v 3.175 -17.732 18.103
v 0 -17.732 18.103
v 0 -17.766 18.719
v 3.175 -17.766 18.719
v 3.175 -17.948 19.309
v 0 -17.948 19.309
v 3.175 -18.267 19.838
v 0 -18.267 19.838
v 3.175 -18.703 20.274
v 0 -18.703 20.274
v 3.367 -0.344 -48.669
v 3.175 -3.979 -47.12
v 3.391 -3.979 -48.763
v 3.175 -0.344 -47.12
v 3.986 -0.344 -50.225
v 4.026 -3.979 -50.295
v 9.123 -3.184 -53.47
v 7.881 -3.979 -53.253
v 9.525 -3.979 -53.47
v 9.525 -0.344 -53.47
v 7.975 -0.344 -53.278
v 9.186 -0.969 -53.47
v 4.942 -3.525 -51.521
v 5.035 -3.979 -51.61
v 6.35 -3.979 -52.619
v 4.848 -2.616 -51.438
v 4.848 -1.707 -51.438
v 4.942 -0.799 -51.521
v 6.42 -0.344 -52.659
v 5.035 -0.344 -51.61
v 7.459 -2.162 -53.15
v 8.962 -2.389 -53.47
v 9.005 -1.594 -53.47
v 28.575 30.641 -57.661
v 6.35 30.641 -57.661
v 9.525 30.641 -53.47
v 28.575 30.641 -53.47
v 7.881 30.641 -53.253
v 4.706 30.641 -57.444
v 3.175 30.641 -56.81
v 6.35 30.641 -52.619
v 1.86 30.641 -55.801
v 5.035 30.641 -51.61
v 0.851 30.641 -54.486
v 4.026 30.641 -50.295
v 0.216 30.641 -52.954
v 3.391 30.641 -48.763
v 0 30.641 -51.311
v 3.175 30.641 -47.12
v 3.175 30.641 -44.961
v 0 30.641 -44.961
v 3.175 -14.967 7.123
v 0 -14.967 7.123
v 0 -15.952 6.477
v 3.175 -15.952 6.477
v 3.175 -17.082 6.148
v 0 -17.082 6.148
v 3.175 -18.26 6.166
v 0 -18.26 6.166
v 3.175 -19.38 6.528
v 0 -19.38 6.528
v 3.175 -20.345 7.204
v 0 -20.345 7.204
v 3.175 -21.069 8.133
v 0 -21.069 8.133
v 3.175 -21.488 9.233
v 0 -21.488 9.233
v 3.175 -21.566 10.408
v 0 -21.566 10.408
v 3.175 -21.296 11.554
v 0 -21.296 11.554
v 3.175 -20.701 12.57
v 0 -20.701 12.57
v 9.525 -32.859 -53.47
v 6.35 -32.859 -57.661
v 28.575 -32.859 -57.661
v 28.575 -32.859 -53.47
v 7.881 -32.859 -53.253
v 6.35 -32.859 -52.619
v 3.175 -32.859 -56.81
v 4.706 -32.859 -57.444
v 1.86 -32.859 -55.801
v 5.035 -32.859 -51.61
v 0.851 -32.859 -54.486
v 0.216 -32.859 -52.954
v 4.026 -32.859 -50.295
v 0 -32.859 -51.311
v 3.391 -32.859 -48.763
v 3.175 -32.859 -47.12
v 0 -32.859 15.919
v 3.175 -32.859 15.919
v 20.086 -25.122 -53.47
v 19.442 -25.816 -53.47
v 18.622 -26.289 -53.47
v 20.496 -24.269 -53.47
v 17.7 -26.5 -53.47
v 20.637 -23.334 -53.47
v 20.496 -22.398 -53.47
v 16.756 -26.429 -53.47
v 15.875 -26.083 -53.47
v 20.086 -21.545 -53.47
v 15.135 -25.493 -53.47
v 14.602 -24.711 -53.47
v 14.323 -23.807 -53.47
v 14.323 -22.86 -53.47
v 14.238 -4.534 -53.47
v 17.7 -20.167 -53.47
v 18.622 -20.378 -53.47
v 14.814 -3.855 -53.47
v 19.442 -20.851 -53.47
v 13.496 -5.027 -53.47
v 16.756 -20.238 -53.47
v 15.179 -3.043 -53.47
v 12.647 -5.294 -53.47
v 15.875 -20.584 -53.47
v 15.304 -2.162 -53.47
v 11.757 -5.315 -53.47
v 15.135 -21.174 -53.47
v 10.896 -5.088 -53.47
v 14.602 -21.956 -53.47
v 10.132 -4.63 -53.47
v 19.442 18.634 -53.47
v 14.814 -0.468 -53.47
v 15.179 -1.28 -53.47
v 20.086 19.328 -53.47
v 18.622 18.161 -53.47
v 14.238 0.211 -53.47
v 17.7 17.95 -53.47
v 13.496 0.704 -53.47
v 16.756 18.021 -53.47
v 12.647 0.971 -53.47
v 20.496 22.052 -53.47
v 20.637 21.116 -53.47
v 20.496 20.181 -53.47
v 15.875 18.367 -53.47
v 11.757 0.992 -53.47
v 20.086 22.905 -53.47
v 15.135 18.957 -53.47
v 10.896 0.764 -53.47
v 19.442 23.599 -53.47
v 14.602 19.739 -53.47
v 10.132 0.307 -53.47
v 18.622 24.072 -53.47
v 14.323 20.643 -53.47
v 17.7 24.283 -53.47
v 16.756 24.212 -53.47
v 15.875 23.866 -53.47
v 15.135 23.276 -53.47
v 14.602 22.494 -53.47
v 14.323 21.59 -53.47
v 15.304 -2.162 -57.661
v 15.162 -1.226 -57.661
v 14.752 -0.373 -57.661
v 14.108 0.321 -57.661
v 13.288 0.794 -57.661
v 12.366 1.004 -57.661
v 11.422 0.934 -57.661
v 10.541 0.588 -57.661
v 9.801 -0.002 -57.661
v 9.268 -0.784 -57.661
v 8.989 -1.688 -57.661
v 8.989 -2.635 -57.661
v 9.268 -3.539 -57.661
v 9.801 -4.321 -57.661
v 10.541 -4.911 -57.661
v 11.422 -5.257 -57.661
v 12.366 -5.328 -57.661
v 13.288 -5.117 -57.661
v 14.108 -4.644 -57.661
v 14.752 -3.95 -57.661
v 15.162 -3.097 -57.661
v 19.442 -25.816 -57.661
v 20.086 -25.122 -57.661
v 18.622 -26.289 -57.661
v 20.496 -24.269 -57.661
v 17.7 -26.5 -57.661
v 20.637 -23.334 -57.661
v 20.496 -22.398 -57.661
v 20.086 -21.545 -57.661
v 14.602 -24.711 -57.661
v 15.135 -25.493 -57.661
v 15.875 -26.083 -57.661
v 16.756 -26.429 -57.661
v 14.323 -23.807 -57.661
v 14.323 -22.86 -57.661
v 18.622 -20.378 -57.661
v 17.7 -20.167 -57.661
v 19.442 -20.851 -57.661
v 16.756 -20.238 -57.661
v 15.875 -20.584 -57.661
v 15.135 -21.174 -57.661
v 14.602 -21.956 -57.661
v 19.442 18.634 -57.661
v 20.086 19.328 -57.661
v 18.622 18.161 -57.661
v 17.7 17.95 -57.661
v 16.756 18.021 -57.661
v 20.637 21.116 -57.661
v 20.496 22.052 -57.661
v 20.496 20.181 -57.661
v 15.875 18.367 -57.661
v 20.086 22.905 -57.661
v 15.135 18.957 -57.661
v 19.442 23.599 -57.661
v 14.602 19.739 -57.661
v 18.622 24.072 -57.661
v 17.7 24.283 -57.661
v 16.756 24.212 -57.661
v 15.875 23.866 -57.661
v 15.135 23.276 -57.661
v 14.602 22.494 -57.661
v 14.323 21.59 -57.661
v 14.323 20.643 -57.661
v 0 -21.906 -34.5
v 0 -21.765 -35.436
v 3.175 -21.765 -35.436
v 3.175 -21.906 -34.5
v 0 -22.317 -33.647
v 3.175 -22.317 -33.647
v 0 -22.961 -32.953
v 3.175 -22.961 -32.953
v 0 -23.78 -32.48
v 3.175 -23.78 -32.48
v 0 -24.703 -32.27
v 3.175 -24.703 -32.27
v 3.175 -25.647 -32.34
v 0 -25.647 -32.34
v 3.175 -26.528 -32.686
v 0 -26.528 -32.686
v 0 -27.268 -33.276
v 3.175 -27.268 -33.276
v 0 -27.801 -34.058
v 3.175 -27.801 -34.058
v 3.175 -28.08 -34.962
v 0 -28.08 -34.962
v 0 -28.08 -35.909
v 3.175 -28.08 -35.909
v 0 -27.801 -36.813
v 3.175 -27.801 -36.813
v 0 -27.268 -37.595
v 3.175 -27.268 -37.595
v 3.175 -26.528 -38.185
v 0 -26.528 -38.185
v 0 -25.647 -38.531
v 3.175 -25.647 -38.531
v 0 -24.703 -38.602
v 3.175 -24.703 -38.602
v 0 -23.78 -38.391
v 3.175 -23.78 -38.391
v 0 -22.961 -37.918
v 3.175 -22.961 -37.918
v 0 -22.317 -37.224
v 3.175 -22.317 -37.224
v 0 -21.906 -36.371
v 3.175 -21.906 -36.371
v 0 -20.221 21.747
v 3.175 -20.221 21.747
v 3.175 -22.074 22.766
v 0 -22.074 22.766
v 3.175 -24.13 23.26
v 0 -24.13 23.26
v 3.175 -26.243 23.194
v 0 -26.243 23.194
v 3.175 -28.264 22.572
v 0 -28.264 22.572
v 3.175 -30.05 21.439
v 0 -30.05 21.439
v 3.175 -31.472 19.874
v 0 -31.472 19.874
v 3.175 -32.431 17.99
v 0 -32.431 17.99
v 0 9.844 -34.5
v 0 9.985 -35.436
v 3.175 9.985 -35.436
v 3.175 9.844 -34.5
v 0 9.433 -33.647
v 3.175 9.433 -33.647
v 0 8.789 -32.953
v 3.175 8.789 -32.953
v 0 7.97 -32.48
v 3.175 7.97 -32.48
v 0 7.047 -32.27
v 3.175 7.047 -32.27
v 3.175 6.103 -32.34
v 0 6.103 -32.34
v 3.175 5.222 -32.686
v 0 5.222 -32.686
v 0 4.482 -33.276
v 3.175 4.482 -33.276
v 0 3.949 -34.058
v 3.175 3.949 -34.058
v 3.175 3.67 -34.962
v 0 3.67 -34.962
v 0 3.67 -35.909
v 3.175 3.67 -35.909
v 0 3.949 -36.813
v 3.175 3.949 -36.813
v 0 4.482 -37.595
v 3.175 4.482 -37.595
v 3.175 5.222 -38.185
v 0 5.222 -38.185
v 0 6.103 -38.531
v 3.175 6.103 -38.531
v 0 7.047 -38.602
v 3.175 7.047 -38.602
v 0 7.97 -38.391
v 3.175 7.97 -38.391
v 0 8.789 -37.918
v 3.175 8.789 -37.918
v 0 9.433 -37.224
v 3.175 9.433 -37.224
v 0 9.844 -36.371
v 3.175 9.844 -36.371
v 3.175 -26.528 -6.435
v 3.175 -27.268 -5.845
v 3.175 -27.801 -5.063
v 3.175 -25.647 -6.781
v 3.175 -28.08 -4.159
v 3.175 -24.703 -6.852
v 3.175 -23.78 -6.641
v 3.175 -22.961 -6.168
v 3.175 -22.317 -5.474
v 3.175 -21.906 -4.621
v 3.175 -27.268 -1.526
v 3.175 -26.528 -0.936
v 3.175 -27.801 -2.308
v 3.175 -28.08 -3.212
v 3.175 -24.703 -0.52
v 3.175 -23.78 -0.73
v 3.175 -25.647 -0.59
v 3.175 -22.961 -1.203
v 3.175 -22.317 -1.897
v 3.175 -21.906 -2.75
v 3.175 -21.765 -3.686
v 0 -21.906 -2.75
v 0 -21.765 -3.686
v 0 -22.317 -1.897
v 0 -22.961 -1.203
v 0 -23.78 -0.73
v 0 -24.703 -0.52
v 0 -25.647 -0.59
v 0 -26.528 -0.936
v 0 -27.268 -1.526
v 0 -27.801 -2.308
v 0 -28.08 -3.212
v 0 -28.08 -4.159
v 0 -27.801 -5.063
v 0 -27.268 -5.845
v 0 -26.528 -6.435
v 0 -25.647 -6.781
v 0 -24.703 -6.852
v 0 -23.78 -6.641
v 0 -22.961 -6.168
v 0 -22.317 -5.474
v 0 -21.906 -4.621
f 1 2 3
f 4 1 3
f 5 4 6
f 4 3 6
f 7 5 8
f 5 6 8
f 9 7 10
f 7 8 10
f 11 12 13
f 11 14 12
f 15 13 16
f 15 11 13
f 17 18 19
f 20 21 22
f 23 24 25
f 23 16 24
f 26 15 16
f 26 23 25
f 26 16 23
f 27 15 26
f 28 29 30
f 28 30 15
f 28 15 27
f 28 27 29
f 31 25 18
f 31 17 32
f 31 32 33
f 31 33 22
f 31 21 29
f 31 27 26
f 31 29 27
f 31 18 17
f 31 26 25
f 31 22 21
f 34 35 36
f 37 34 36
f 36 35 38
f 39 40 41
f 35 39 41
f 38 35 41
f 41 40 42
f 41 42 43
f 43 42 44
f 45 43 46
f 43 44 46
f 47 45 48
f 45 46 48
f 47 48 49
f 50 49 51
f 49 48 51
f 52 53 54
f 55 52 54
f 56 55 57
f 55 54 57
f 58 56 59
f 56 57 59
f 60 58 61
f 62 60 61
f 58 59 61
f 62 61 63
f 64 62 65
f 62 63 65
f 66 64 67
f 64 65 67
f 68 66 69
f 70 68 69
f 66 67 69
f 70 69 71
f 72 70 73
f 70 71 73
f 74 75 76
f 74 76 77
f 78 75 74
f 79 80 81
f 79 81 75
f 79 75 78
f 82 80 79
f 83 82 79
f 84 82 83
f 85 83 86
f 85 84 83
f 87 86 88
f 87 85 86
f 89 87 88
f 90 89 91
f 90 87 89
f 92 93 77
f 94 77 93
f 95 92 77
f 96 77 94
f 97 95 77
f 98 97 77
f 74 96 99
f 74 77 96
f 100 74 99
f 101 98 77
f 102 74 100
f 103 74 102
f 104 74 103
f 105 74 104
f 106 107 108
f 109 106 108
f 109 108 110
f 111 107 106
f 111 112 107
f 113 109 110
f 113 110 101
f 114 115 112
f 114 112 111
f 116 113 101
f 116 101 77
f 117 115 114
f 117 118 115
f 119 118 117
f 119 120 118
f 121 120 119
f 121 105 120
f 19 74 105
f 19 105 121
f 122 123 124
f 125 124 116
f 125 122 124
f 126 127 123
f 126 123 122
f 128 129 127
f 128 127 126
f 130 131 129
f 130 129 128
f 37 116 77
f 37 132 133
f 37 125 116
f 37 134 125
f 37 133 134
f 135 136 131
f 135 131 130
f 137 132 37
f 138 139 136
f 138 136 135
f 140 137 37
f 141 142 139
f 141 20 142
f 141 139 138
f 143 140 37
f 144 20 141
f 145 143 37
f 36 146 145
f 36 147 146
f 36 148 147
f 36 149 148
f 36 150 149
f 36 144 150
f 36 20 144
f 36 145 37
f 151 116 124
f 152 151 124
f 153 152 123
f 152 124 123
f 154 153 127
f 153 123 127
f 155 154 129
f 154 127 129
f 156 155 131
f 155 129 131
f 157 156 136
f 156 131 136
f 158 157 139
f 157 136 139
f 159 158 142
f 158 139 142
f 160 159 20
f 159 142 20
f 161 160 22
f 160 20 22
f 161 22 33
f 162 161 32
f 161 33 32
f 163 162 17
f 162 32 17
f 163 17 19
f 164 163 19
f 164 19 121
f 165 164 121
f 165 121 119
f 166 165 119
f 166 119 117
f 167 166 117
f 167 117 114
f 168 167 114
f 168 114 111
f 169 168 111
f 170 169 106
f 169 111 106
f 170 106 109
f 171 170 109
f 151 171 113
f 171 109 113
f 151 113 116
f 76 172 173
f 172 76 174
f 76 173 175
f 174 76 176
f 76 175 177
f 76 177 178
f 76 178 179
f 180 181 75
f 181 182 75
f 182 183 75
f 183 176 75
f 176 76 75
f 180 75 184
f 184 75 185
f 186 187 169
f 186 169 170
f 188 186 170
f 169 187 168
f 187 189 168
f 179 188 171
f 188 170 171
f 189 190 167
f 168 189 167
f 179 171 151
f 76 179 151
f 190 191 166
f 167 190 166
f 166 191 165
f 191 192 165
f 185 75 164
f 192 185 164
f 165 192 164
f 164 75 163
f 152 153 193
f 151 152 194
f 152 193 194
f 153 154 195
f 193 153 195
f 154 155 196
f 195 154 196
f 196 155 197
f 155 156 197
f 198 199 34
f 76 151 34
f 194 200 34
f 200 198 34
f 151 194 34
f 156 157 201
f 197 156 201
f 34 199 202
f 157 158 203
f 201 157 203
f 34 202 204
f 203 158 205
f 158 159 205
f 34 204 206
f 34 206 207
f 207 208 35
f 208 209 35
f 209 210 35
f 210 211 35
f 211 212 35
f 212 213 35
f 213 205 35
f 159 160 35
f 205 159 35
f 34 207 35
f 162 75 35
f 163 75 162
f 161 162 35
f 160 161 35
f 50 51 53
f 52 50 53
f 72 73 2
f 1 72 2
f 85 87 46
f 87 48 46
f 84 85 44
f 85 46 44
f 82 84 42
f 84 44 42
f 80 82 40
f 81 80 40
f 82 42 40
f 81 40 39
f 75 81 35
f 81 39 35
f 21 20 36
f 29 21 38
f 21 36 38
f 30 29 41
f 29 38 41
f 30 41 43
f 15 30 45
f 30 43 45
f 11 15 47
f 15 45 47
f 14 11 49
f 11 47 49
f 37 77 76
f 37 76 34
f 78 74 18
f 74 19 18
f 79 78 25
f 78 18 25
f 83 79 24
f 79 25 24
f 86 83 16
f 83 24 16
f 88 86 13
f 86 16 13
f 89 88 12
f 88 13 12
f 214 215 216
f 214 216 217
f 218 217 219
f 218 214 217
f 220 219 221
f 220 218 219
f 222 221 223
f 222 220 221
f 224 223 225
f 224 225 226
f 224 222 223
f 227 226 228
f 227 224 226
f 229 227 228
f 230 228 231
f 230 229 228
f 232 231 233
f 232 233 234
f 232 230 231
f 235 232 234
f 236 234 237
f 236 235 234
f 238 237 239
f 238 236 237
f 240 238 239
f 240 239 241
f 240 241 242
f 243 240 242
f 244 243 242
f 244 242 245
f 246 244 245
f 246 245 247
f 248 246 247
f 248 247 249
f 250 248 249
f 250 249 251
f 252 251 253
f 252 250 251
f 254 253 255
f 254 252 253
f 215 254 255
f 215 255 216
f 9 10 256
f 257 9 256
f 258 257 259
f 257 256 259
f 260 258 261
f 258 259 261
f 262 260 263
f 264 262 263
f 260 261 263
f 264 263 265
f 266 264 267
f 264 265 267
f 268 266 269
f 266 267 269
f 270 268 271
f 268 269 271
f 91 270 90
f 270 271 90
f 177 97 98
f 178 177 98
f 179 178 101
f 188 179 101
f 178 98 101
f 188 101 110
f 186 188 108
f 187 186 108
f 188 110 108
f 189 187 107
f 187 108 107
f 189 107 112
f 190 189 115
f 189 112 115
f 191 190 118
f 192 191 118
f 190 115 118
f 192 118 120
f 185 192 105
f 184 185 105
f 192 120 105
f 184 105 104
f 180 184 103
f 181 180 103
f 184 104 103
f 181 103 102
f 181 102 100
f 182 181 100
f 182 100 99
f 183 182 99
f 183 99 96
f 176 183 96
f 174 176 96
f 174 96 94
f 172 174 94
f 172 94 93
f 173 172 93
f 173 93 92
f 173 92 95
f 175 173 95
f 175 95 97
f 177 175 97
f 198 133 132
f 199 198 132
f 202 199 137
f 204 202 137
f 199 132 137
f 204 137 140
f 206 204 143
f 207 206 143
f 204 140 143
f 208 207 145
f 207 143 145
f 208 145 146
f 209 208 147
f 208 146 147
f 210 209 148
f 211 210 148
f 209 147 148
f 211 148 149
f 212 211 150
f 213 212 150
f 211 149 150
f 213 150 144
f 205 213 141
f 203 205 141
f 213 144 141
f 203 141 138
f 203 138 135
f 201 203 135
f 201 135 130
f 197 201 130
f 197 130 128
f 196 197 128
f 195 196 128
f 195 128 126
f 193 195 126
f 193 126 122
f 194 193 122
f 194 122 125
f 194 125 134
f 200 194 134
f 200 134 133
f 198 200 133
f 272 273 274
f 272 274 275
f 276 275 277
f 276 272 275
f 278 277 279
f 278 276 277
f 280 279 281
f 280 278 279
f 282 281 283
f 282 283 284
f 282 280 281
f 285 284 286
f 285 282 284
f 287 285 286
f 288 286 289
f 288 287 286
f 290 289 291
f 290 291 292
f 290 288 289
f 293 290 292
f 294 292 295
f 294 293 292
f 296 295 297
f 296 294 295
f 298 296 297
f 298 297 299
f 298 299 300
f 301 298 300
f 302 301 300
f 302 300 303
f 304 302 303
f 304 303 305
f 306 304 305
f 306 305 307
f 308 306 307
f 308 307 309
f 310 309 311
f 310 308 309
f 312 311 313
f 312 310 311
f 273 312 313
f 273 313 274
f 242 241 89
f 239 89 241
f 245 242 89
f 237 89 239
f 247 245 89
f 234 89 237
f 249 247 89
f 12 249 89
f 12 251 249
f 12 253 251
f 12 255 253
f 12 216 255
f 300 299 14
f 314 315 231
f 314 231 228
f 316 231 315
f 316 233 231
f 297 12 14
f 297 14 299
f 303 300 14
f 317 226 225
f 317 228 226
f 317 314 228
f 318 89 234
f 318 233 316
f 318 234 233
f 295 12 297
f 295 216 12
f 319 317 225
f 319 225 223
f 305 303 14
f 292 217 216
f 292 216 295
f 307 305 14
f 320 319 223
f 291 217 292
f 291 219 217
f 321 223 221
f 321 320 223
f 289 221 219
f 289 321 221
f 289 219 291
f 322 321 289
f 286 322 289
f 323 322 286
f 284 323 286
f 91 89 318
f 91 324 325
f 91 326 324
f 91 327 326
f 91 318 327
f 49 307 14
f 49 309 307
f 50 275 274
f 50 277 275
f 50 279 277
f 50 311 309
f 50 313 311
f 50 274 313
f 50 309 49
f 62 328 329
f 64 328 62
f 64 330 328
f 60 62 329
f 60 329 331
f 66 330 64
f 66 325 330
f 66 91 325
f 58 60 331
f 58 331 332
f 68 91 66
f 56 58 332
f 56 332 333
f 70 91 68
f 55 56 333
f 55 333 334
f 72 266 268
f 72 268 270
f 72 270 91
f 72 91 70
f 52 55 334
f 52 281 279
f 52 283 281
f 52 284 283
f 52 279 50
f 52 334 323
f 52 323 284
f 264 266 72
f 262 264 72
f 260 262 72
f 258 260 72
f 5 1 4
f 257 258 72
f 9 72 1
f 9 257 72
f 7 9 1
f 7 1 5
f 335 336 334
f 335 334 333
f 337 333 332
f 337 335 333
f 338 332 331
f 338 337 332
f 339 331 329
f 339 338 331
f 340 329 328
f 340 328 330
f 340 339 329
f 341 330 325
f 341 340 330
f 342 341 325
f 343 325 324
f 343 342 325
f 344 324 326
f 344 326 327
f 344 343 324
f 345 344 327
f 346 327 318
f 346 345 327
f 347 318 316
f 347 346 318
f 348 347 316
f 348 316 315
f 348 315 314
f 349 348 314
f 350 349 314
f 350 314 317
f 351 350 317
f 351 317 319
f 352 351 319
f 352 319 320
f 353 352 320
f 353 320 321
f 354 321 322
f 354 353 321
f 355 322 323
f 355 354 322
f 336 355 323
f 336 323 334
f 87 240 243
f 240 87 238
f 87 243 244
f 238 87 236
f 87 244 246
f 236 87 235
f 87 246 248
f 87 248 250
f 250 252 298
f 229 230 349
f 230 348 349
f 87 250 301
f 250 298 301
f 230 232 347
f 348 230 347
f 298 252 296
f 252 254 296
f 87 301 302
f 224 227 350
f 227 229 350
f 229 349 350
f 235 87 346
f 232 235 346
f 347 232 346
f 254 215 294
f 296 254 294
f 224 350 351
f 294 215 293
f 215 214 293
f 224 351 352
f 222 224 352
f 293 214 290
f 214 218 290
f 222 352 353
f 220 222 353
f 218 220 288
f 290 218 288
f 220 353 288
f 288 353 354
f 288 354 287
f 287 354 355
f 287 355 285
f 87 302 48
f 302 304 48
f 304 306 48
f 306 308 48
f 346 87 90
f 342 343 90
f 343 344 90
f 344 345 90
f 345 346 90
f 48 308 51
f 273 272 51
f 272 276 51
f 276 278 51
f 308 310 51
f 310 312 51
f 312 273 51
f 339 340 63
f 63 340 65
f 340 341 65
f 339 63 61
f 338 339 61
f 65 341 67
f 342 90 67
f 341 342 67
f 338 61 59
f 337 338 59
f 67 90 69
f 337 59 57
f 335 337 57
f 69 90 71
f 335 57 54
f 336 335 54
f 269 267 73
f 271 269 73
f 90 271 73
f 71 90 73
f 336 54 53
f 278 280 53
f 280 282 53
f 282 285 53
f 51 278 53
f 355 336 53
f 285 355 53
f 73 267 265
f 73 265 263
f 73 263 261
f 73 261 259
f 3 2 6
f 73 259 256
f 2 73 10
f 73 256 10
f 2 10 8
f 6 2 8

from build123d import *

# Parameters (mm, degrees)
F0_R     = 3.175
F1_DEPTH = 3.175
F2_W     = 63.5
F2_H     = 4.191
F3_DEPTH = 25.4
F4_R     = 3.175
F5_DEPTH = 25.4
F6_R     = 6.35


with BuildPart() as f1:
    # F0 (on Right) → F1 (new body)
    with BuildSketch(Plane.YZ):
        with BuildLine():
            ThreePointArc((-17.731718, 18.103163), (-17.947804, 19.309376), (-18.70349, 20.274041))
            ThreePointArc((-18.70349, 20.274041), (-27.274694, 22.950849), (-32.858508, 15.918648))
            Line((-32.858508, 15.918648), (-32.858508, -57.660647))
            Line((-32.858508, -57.660647), (30.641492, -57.660647))
            Line((30.641492, -57.660647), (30.641492, -44.960647))
            Line((30.641492, -44.960647), (-14.967139, 7.123187))
            ThreePointArc((-14.967139, 7.123187), (-20.344879, 7.203814), (-20.701, 12.570355))
            Line((-20.701, 12.570355), (-17.731718, 18.103163))
        make_face()
        with Locations((-24.940386, -35.435647)):
            Circle(F0_R, mode=Mode.SUBTRACT)
        with Locations((6.809614, -35.435647)):
            Circle(F0_R, mode=Mode.SUBTRACT)
        with Locations((-24.940386, -3.685647)):
            Circle(F0_R, mode=Mode.SUBTRACT)
    extrude(amount=F1_DEPTH)

    # F2 (on face) → F3 (join)
    with BuildSketch(Plane.YZ.offset(3.175)):
        with Locations((-1.108508, -55.565147)):
            Rectangle(F2_W, F2_H)
    extrude(amount=F3_DEPTH)

    # F4 (on face) → F5 (cut)
    with BuildSketch(Plane.XY.offset(-53.469647)):
        with Locations((17.462499, -23.333508)):
            Circle(F4_R)
        with Locations((17.462499, 21.116492)):
            Circle(F4_R)
        with Locations((12.1285, -2.161645)):
            Circle(F4_R)
    extrude(amount=-F5_DEPTH, mode=Mode.SUBTRACT)

    # F6
    f6_edges = [f1.edges().sort_by_distance(p)[0] for p in [
        (3.175, -1.108508, -53.469647),
        (0, -1.108508, -57.660647),
    ]]
    fillet(f6_edges, radius=F6_R)


solid = f1.part
